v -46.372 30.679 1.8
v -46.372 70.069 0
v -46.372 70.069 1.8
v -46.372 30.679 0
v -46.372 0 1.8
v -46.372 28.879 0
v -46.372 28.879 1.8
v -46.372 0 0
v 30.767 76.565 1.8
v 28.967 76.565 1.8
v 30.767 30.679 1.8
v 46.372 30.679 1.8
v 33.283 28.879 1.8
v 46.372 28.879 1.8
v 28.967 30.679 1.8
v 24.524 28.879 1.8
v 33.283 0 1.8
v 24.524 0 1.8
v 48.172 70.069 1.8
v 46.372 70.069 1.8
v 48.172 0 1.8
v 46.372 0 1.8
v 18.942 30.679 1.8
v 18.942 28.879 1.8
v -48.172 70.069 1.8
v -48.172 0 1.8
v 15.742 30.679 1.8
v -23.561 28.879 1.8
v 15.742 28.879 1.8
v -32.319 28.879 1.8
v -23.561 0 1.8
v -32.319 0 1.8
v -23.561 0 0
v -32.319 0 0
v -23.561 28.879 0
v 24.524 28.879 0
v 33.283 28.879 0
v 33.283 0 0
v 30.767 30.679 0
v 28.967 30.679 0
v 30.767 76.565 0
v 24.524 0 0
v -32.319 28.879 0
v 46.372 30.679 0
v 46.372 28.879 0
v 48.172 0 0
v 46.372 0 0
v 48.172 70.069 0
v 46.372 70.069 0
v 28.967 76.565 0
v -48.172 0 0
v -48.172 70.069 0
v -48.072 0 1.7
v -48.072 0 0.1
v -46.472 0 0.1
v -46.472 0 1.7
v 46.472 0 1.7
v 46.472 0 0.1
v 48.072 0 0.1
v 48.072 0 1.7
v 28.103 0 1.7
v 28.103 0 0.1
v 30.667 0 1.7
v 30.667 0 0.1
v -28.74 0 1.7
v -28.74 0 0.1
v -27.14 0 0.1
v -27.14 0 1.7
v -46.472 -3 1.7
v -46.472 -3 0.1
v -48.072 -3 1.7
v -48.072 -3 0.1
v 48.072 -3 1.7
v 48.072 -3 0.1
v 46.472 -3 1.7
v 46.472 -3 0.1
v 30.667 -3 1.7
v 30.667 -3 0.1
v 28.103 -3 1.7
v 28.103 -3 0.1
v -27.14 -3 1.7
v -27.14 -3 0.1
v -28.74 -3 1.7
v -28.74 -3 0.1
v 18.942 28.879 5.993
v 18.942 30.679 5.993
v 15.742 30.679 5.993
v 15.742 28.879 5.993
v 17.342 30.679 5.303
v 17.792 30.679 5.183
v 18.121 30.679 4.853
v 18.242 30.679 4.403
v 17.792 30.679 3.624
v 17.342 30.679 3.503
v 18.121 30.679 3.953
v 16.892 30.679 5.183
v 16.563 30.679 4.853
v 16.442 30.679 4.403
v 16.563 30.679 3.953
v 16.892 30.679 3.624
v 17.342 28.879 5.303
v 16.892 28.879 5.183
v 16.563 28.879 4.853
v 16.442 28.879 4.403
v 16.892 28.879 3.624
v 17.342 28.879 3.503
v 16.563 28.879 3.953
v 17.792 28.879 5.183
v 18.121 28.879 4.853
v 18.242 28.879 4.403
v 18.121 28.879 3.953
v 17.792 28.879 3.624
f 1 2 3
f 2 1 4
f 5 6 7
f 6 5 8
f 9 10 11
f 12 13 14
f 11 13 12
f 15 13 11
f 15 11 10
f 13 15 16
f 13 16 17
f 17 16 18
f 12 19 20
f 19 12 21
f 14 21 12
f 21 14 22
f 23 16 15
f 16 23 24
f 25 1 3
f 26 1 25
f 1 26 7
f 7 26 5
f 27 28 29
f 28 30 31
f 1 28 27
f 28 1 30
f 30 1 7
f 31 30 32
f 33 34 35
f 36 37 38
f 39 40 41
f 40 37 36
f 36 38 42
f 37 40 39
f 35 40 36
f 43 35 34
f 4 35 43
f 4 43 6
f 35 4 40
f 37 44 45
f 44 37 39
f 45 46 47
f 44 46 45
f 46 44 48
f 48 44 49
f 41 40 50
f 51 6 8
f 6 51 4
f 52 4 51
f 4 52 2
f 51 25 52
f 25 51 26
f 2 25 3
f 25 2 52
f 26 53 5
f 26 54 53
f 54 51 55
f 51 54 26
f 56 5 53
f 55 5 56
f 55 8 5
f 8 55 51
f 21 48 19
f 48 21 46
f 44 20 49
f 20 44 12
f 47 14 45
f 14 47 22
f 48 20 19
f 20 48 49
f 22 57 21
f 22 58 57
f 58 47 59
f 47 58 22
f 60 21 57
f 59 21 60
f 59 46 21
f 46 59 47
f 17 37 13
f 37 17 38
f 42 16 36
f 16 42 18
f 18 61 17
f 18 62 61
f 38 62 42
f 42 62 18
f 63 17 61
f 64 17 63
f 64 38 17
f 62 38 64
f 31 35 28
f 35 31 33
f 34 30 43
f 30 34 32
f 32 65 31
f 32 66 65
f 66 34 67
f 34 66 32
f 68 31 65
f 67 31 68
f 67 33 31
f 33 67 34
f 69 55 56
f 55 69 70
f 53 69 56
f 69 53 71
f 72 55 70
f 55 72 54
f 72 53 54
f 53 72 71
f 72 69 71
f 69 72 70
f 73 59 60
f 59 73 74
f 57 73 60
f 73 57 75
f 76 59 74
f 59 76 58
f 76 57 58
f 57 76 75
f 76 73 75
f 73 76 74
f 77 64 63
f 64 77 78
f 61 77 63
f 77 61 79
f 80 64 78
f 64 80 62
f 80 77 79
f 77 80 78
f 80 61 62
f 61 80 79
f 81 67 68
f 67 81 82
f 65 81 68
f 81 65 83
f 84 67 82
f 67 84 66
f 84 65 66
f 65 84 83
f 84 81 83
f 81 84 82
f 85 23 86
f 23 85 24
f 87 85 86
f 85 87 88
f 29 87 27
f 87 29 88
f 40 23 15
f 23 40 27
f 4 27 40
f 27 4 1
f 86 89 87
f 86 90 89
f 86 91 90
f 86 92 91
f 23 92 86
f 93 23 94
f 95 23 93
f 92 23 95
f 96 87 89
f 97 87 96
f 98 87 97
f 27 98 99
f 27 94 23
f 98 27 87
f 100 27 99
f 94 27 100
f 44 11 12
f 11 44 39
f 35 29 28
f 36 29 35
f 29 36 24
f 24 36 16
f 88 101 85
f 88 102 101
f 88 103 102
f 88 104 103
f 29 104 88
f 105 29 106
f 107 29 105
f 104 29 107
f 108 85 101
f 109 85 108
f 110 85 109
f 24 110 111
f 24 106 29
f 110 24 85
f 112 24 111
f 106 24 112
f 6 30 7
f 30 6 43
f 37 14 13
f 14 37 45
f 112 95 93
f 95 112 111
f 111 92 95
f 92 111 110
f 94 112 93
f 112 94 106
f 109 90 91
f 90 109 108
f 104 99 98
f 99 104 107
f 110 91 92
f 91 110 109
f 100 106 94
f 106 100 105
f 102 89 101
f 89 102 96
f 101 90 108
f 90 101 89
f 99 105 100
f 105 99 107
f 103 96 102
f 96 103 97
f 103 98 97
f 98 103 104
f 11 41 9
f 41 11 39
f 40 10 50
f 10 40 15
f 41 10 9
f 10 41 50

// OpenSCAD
// =====================================================================
//  VIEW 09: RAILING  -  print 2
//  Milwaukee Road 1939 rib side bay window caboose - G scale (1:29)
//  End railing frame with brake staff bracket
//  Print orientation: flat
//
//  Open this file in OpenSCAD to look at just this part.
//  To export this part's STL: Render (F6), then File > Export > STL.
//  The part's code lives in library/railing.scad; settings in
//  library/caboose_params.scad.
// =====================================================================

part     = "railing";    // which part - leave as is
view     = "print";  // "print"     = laid out as it goes on the printer bed
                     //               (same as the exported STL)
                     // "installed" = in its place on the car (all copies)
show_car = false;    // with "installed": faint see-through body, roof and
                     //   underframe around it for context

include <../library/caboose_all.scad>

if (view == "installed") {
    caboose_installed(part);
    if (show_car) car_ghost();
} else {
    caboose_print(part);
}
echo(str("railing: print 2"));
